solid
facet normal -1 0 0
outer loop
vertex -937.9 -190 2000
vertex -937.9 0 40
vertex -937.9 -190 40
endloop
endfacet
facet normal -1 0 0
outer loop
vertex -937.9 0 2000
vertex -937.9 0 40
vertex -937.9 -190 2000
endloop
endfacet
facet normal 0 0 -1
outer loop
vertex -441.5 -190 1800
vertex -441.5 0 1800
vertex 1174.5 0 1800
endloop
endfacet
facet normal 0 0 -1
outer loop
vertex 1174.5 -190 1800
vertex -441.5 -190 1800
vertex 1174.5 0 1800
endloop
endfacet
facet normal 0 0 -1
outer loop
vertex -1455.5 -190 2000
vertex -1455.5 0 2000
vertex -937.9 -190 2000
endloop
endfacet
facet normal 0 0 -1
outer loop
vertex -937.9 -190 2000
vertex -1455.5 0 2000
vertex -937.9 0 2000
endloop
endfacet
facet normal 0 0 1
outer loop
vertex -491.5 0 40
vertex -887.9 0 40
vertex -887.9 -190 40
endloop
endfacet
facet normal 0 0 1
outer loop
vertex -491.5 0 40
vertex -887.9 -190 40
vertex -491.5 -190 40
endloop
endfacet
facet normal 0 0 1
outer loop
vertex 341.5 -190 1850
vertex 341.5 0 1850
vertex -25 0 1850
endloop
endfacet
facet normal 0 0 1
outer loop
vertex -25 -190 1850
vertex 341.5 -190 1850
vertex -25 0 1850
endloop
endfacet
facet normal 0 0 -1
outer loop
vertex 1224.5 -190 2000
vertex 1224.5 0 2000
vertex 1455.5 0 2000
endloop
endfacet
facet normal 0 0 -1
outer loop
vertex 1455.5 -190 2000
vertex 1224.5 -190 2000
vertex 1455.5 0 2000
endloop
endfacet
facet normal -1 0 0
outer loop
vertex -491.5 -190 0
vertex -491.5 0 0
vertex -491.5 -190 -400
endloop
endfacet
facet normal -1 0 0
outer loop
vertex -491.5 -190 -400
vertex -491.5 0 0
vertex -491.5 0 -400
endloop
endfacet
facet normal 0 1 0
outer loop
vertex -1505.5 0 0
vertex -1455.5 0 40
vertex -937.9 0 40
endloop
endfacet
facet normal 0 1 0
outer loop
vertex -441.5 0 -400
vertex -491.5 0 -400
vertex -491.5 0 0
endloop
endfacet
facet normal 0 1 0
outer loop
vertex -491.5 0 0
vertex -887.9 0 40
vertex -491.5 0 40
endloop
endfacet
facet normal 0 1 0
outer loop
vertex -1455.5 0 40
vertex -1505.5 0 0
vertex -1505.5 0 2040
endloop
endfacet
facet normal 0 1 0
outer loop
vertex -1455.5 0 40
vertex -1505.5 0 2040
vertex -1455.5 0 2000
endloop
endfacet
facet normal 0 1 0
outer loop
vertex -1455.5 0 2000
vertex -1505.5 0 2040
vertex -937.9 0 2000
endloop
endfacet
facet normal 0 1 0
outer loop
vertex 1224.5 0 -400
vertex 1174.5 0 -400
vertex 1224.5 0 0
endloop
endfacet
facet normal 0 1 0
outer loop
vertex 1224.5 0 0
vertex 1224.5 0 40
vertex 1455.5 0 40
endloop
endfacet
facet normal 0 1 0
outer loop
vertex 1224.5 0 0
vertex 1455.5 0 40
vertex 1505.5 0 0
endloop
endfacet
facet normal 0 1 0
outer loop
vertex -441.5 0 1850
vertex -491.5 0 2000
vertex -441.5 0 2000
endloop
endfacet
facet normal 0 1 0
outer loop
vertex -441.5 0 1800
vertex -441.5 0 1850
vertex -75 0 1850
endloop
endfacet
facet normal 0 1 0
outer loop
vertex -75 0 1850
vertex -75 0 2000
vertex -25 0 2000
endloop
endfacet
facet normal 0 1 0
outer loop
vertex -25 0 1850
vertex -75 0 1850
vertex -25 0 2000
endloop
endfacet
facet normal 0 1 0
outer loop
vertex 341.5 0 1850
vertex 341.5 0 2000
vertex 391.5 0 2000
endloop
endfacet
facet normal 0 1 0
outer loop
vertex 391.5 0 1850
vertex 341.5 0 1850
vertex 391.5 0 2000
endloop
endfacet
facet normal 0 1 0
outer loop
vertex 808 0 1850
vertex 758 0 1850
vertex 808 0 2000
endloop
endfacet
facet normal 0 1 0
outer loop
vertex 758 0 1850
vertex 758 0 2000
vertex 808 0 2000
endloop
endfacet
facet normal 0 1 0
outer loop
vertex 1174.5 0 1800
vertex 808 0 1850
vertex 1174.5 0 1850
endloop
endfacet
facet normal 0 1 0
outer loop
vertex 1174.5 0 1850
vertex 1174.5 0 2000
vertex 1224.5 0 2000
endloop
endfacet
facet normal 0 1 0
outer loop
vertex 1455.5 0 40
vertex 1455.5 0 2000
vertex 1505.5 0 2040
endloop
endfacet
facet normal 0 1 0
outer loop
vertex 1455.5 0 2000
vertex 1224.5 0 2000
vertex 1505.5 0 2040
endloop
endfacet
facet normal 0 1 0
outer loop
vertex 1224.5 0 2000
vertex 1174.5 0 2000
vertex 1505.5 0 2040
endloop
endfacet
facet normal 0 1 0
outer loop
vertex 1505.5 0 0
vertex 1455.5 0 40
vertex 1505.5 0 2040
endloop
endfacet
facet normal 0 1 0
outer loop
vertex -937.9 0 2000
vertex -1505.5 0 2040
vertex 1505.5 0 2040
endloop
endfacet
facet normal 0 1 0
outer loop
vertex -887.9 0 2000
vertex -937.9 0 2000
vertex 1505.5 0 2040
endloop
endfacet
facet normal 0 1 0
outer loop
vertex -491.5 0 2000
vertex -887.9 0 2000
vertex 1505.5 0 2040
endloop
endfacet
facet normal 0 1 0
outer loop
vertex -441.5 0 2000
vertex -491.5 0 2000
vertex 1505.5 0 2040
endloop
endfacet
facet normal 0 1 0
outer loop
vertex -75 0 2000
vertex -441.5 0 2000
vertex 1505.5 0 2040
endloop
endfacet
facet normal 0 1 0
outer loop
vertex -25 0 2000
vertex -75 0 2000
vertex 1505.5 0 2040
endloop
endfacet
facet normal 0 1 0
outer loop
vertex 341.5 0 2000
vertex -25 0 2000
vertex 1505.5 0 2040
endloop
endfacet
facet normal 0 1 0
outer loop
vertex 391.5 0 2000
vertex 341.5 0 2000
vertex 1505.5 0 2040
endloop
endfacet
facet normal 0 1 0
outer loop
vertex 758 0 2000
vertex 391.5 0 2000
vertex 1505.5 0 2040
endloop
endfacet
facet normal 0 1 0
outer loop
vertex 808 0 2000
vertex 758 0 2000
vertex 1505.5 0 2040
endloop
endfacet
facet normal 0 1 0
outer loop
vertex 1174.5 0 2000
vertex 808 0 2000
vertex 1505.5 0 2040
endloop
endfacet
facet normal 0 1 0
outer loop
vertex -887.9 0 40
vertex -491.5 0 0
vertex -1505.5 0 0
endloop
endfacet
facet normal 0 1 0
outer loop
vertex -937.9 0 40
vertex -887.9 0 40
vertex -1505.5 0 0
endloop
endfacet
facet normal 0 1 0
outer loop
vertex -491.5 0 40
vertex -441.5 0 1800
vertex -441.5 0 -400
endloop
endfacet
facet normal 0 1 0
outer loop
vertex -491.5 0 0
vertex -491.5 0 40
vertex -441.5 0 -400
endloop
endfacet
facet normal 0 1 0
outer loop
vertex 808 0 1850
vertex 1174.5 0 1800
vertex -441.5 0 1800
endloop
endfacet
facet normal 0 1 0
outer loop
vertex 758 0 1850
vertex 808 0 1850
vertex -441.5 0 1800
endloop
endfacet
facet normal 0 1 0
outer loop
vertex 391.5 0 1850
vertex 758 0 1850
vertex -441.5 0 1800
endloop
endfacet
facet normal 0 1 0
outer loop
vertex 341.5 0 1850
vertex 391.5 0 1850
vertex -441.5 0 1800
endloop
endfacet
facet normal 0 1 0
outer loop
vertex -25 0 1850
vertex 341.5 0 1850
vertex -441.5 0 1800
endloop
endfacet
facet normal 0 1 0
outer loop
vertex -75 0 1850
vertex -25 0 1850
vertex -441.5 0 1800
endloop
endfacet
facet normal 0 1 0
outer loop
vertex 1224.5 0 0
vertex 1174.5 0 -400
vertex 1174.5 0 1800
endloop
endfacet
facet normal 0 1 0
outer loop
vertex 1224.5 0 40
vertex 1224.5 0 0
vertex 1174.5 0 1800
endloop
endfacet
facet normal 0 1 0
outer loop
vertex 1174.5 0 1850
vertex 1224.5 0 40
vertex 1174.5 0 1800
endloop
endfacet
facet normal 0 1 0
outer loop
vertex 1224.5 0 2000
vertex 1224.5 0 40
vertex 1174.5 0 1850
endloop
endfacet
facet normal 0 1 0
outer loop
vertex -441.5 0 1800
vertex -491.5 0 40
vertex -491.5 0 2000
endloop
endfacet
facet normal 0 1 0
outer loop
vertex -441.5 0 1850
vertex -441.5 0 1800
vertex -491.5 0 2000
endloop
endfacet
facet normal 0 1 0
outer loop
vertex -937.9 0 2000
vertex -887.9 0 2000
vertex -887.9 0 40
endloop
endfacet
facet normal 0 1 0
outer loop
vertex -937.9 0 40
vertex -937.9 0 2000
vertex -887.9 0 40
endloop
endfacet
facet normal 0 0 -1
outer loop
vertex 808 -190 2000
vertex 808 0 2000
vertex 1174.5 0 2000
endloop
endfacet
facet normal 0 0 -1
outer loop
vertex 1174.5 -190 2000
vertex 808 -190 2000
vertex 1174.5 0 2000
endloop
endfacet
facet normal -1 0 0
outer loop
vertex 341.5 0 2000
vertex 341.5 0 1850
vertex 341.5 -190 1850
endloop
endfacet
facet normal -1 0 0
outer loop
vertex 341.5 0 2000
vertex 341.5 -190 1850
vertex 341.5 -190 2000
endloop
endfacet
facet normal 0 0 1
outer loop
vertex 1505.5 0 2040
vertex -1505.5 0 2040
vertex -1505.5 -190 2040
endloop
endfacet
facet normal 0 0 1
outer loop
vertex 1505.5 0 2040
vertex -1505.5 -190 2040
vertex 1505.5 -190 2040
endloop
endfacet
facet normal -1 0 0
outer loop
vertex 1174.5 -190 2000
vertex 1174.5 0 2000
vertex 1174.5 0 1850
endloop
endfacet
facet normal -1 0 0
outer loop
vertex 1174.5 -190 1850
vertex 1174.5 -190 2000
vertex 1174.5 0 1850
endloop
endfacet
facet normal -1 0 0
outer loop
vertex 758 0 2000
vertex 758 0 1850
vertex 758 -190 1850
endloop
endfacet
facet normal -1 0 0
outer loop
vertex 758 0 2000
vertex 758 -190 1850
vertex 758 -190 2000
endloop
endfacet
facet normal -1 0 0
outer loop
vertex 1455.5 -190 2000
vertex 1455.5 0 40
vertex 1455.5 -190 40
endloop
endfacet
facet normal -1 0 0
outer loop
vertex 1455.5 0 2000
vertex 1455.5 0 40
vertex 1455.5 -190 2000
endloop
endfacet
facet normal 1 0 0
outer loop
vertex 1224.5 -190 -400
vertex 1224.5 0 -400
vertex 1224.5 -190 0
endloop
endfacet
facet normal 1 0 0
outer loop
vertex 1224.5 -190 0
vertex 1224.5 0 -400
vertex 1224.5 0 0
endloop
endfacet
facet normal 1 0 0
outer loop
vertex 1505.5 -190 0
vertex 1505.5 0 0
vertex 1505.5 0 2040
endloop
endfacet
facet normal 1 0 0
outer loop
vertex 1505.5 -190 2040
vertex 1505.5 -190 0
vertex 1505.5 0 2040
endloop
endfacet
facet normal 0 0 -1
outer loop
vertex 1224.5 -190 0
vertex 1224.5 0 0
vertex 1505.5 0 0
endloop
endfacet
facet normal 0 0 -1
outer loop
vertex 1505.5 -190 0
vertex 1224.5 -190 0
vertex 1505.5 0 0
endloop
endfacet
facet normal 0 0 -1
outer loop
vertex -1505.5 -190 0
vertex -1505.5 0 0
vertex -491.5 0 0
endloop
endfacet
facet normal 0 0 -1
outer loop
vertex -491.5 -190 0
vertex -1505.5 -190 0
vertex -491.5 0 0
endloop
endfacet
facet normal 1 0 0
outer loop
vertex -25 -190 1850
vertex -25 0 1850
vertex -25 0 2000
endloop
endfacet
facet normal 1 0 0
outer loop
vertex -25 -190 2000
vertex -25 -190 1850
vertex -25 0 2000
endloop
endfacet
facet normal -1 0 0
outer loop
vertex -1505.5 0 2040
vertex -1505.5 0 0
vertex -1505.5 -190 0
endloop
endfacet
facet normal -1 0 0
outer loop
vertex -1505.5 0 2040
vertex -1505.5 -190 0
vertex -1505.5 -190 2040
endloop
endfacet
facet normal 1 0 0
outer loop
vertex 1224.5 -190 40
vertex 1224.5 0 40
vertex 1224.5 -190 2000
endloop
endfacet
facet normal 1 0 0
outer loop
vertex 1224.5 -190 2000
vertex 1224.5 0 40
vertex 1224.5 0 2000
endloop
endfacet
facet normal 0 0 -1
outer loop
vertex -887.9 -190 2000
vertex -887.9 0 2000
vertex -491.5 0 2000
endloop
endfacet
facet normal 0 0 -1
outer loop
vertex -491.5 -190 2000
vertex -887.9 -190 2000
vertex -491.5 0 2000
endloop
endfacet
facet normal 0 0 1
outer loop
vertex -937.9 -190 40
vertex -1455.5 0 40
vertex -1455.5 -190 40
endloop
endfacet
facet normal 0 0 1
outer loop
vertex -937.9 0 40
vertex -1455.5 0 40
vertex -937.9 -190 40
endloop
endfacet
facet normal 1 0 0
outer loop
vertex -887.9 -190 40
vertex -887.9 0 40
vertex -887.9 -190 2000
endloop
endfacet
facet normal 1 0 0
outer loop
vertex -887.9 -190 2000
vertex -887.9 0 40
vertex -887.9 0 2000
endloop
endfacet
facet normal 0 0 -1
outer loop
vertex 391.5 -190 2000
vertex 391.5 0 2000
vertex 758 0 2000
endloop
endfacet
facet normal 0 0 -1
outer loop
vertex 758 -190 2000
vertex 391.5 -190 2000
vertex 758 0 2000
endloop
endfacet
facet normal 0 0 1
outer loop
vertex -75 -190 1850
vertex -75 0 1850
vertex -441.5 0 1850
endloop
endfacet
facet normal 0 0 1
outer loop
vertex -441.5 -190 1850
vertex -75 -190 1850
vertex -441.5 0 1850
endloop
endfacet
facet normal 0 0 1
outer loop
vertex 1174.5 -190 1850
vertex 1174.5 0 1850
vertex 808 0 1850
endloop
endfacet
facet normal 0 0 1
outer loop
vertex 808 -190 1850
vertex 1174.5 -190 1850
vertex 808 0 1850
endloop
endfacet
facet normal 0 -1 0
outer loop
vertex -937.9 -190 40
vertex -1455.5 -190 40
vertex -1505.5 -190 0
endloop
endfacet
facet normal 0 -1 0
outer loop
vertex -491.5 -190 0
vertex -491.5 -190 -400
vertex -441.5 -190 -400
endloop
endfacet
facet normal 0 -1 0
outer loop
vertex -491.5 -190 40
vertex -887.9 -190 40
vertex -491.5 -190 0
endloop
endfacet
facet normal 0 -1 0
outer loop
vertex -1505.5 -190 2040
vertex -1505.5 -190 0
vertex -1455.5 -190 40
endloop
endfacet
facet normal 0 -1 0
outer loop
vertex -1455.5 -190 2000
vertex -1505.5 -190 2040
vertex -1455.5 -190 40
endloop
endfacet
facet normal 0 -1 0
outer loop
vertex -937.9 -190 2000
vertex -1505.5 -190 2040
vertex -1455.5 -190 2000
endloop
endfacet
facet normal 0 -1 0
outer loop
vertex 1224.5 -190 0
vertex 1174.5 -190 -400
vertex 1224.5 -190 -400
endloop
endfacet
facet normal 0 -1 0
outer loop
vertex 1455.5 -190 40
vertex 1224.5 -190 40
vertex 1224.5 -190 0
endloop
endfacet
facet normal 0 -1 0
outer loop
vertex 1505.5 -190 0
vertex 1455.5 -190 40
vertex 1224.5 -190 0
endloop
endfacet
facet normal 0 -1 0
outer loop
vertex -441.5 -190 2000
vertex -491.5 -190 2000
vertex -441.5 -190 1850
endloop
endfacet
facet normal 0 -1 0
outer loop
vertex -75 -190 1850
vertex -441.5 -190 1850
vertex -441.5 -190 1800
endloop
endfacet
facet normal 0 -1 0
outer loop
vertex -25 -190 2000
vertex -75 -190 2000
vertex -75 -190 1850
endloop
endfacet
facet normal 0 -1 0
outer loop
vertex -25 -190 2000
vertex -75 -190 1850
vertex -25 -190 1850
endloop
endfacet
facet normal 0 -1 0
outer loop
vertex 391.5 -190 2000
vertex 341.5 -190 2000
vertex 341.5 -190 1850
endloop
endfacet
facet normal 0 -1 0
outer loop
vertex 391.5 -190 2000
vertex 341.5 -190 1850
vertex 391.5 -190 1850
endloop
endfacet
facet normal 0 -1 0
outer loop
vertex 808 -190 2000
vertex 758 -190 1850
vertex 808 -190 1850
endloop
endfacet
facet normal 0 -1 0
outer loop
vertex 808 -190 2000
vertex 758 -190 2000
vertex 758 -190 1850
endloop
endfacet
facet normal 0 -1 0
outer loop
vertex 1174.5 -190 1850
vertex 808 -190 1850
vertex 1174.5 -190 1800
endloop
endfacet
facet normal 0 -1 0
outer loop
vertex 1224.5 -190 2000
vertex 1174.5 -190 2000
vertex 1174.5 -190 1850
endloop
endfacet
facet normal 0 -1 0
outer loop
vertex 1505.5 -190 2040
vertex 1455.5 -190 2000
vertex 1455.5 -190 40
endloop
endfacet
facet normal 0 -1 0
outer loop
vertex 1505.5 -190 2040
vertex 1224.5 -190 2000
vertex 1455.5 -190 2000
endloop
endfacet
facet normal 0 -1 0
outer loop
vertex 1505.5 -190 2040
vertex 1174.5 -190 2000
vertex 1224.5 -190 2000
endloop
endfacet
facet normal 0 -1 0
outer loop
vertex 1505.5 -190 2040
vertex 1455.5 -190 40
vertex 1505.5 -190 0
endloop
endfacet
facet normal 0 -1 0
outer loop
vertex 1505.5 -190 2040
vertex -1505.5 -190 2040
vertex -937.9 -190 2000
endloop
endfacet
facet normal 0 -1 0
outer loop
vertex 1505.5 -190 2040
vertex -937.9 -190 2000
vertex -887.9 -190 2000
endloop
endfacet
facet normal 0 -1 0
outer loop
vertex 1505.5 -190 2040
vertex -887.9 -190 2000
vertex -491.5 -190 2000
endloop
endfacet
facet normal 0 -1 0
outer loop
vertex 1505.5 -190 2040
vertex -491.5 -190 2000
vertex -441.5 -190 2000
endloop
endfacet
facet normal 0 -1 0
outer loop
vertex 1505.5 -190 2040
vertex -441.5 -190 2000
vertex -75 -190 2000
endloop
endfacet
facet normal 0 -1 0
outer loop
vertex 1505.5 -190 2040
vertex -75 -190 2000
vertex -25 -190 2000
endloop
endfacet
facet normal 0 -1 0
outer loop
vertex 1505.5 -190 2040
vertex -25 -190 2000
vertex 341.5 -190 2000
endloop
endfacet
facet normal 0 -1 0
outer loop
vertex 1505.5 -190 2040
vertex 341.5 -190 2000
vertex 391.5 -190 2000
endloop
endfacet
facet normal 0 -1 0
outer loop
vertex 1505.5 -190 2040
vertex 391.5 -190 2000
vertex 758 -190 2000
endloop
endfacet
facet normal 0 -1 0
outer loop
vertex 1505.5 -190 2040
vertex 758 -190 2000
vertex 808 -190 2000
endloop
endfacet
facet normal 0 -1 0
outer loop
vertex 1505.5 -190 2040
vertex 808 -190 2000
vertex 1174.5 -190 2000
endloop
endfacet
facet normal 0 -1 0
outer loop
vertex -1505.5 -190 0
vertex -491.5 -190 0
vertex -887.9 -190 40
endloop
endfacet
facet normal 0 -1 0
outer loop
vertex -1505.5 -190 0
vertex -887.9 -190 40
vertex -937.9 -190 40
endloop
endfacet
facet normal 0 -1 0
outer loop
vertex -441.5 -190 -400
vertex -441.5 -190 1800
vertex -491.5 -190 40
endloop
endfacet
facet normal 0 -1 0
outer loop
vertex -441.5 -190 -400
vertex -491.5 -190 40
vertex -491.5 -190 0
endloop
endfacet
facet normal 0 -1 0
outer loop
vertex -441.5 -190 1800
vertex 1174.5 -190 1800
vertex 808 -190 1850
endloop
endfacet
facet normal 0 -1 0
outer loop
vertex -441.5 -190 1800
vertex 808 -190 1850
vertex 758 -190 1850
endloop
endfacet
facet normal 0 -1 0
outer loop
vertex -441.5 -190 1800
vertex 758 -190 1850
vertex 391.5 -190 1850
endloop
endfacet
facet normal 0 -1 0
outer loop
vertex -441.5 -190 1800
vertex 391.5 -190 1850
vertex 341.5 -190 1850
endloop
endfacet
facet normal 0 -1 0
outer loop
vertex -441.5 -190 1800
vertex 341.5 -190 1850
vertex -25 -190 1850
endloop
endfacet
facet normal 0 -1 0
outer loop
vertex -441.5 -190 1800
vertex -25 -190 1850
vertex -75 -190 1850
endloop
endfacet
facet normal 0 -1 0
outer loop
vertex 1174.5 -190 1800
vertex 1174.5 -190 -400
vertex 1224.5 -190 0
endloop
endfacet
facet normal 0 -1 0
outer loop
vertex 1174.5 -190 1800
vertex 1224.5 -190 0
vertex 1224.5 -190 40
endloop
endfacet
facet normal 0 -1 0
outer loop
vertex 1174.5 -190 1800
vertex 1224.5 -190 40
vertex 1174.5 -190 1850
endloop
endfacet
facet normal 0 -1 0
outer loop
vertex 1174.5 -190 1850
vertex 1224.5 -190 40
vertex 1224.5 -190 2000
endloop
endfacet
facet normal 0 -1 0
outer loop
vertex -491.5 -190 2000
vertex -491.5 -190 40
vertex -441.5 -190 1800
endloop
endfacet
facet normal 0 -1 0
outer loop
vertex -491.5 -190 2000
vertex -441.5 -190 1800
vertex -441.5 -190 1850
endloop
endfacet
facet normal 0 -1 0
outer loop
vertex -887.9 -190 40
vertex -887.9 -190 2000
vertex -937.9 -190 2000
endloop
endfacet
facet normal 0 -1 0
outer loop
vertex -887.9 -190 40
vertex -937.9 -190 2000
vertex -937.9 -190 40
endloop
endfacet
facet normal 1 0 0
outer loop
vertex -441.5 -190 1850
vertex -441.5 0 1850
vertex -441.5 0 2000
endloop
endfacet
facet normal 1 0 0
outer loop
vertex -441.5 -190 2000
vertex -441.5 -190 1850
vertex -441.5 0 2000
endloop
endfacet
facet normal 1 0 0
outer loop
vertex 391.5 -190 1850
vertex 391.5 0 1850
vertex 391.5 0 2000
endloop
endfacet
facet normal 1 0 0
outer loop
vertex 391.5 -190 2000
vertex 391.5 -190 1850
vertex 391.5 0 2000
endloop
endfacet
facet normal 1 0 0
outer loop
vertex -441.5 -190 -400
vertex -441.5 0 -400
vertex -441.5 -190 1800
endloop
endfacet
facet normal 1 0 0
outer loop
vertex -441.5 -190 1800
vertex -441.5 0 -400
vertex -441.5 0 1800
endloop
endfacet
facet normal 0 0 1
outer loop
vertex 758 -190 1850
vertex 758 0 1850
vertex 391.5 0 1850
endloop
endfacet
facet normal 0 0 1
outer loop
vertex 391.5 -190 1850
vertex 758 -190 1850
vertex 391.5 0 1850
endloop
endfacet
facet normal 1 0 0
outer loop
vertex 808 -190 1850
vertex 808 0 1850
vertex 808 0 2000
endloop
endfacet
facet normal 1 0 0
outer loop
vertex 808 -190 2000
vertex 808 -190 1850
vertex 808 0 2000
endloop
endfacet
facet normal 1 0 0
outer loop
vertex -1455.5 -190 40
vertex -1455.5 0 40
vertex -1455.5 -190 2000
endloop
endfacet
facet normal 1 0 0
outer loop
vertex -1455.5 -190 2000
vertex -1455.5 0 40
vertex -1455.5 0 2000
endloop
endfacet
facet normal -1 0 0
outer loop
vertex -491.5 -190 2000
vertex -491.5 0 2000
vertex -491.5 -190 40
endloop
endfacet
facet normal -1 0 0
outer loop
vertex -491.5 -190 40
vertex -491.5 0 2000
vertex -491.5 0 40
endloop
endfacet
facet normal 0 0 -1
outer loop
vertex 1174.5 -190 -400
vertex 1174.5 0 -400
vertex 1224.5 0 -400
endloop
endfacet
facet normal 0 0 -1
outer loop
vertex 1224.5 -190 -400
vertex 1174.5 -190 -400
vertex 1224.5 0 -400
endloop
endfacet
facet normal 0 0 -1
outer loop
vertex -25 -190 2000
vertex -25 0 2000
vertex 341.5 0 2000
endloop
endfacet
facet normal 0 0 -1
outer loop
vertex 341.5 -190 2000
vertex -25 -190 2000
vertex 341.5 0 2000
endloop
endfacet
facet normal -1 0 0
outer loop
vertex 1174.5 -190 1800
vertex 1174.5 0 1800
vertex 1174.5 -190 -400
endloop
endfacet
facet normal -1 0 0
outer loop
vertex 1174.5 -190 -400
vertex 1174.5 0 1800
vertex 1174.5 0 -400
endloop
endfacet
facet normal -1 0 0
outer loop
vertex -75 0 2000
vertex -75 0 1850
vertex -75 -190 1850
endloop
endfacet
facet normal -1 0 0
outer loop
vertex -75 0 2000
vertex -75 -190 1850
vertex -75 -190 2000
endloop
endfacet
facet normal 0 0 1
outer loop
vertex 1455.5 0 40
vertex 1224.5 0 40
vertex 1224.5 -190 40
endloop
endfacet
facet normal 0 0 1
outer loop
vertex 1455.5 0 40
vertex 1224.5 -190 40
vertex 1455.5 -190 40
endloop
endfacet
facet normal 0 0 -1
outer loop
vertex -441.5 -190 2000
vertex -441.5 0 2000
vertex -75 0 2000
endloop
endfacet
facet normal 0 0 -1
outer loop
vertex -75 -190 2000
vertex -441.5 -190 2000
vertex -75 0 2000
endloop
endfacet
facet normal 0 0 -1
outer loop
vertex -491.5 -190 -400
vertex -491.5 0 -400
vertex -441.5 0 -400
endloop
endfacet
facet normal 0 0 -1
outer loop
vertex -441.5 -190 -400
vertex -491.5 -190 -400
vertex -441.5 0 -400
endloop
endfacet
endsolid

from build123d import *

# Parameters (mm, degrees)
F0_W     = 1014
F0_H     = 40
F1_DEPTH = 190
F0_W_2   = 3011
F2_DEPTH = 190
F3_W     = 50
F3_H     = 1960
F3_H_2   = 150
F0_W_3   = 281
F4_DEPTH = 190


# Not quite as in the source:
# - a feature names something its author has since deleted; it is built from what else it names


with BuildPart() as f1:
    # F0 (on Front) → F1 (new body)
    with BuildSketch(Plane.XZ):
        with Locations((-998.5, 20)):
            Rectangle(F0_W, F0_H)
    extrude(amount=F1_DEPTH)



with BuildPart() as f2:
    # F0 (on Front) → F2 (new body)
    with BuildSketch(Plane.XZ):
        with Locations((0, 2020)):
            Rectangle(F0_W_2, F0_H)
    extrude(amount=F2_DEPTH)


with BuildPart() as f1_1:
    add(f1.part)

    add(f2.part)  # F4 merges F2
    # F3 (on Front) + F0 (on Front) → F4 (join)
    with BuildSketch(Plane.XZ):
        with Locations((1480.5, 1020)):
            Rectangle(F3_W, F3_H)
        Polygon((1224.5, 2000), (1174.5, 2000), (1174.5, 1850), (1174.5, 1800), (1174.5, -400), (1224.5, -400), align=None)
        with Locations((783, 1925)):
            Rectangle(F3_W, F3_H_2)
        with Locations((366.5, 1925)):
            Rectangle(F3_W, F3_H_2)
        with Locations((-50, 1925)):
            Rectangle(F3_W, F3_H_2)
        Polygon((-441.5, -400), (-441.5, 1800), (-441.5, 1850), (-441.5, 2000), (-491.5, 2000), (-491.5, -400), align=None)
        with Locations((-912.9, 1020)):
            Rectangle(F3_W, F3_H)
        with Locations((-1480.5, 1020)):
            Rectangle(F3_W, F3_H)
        Polygon((1174.5, 1800), (1174.5, 1850), (808, 1850), (758, 1850), (391.5, 1850), (341.5, 1850), (-25, 1850), (-75, 1850), (-441.5, 1850), (-441.5, 1800), align=None)
    with BuildSketch(Plane.XZ):
        with Locations((1365, 20)):
            Rectangle(F0_W_3, F0_H)
    extrude(amount=F4_DEPTH)


solid = f1_1.part
